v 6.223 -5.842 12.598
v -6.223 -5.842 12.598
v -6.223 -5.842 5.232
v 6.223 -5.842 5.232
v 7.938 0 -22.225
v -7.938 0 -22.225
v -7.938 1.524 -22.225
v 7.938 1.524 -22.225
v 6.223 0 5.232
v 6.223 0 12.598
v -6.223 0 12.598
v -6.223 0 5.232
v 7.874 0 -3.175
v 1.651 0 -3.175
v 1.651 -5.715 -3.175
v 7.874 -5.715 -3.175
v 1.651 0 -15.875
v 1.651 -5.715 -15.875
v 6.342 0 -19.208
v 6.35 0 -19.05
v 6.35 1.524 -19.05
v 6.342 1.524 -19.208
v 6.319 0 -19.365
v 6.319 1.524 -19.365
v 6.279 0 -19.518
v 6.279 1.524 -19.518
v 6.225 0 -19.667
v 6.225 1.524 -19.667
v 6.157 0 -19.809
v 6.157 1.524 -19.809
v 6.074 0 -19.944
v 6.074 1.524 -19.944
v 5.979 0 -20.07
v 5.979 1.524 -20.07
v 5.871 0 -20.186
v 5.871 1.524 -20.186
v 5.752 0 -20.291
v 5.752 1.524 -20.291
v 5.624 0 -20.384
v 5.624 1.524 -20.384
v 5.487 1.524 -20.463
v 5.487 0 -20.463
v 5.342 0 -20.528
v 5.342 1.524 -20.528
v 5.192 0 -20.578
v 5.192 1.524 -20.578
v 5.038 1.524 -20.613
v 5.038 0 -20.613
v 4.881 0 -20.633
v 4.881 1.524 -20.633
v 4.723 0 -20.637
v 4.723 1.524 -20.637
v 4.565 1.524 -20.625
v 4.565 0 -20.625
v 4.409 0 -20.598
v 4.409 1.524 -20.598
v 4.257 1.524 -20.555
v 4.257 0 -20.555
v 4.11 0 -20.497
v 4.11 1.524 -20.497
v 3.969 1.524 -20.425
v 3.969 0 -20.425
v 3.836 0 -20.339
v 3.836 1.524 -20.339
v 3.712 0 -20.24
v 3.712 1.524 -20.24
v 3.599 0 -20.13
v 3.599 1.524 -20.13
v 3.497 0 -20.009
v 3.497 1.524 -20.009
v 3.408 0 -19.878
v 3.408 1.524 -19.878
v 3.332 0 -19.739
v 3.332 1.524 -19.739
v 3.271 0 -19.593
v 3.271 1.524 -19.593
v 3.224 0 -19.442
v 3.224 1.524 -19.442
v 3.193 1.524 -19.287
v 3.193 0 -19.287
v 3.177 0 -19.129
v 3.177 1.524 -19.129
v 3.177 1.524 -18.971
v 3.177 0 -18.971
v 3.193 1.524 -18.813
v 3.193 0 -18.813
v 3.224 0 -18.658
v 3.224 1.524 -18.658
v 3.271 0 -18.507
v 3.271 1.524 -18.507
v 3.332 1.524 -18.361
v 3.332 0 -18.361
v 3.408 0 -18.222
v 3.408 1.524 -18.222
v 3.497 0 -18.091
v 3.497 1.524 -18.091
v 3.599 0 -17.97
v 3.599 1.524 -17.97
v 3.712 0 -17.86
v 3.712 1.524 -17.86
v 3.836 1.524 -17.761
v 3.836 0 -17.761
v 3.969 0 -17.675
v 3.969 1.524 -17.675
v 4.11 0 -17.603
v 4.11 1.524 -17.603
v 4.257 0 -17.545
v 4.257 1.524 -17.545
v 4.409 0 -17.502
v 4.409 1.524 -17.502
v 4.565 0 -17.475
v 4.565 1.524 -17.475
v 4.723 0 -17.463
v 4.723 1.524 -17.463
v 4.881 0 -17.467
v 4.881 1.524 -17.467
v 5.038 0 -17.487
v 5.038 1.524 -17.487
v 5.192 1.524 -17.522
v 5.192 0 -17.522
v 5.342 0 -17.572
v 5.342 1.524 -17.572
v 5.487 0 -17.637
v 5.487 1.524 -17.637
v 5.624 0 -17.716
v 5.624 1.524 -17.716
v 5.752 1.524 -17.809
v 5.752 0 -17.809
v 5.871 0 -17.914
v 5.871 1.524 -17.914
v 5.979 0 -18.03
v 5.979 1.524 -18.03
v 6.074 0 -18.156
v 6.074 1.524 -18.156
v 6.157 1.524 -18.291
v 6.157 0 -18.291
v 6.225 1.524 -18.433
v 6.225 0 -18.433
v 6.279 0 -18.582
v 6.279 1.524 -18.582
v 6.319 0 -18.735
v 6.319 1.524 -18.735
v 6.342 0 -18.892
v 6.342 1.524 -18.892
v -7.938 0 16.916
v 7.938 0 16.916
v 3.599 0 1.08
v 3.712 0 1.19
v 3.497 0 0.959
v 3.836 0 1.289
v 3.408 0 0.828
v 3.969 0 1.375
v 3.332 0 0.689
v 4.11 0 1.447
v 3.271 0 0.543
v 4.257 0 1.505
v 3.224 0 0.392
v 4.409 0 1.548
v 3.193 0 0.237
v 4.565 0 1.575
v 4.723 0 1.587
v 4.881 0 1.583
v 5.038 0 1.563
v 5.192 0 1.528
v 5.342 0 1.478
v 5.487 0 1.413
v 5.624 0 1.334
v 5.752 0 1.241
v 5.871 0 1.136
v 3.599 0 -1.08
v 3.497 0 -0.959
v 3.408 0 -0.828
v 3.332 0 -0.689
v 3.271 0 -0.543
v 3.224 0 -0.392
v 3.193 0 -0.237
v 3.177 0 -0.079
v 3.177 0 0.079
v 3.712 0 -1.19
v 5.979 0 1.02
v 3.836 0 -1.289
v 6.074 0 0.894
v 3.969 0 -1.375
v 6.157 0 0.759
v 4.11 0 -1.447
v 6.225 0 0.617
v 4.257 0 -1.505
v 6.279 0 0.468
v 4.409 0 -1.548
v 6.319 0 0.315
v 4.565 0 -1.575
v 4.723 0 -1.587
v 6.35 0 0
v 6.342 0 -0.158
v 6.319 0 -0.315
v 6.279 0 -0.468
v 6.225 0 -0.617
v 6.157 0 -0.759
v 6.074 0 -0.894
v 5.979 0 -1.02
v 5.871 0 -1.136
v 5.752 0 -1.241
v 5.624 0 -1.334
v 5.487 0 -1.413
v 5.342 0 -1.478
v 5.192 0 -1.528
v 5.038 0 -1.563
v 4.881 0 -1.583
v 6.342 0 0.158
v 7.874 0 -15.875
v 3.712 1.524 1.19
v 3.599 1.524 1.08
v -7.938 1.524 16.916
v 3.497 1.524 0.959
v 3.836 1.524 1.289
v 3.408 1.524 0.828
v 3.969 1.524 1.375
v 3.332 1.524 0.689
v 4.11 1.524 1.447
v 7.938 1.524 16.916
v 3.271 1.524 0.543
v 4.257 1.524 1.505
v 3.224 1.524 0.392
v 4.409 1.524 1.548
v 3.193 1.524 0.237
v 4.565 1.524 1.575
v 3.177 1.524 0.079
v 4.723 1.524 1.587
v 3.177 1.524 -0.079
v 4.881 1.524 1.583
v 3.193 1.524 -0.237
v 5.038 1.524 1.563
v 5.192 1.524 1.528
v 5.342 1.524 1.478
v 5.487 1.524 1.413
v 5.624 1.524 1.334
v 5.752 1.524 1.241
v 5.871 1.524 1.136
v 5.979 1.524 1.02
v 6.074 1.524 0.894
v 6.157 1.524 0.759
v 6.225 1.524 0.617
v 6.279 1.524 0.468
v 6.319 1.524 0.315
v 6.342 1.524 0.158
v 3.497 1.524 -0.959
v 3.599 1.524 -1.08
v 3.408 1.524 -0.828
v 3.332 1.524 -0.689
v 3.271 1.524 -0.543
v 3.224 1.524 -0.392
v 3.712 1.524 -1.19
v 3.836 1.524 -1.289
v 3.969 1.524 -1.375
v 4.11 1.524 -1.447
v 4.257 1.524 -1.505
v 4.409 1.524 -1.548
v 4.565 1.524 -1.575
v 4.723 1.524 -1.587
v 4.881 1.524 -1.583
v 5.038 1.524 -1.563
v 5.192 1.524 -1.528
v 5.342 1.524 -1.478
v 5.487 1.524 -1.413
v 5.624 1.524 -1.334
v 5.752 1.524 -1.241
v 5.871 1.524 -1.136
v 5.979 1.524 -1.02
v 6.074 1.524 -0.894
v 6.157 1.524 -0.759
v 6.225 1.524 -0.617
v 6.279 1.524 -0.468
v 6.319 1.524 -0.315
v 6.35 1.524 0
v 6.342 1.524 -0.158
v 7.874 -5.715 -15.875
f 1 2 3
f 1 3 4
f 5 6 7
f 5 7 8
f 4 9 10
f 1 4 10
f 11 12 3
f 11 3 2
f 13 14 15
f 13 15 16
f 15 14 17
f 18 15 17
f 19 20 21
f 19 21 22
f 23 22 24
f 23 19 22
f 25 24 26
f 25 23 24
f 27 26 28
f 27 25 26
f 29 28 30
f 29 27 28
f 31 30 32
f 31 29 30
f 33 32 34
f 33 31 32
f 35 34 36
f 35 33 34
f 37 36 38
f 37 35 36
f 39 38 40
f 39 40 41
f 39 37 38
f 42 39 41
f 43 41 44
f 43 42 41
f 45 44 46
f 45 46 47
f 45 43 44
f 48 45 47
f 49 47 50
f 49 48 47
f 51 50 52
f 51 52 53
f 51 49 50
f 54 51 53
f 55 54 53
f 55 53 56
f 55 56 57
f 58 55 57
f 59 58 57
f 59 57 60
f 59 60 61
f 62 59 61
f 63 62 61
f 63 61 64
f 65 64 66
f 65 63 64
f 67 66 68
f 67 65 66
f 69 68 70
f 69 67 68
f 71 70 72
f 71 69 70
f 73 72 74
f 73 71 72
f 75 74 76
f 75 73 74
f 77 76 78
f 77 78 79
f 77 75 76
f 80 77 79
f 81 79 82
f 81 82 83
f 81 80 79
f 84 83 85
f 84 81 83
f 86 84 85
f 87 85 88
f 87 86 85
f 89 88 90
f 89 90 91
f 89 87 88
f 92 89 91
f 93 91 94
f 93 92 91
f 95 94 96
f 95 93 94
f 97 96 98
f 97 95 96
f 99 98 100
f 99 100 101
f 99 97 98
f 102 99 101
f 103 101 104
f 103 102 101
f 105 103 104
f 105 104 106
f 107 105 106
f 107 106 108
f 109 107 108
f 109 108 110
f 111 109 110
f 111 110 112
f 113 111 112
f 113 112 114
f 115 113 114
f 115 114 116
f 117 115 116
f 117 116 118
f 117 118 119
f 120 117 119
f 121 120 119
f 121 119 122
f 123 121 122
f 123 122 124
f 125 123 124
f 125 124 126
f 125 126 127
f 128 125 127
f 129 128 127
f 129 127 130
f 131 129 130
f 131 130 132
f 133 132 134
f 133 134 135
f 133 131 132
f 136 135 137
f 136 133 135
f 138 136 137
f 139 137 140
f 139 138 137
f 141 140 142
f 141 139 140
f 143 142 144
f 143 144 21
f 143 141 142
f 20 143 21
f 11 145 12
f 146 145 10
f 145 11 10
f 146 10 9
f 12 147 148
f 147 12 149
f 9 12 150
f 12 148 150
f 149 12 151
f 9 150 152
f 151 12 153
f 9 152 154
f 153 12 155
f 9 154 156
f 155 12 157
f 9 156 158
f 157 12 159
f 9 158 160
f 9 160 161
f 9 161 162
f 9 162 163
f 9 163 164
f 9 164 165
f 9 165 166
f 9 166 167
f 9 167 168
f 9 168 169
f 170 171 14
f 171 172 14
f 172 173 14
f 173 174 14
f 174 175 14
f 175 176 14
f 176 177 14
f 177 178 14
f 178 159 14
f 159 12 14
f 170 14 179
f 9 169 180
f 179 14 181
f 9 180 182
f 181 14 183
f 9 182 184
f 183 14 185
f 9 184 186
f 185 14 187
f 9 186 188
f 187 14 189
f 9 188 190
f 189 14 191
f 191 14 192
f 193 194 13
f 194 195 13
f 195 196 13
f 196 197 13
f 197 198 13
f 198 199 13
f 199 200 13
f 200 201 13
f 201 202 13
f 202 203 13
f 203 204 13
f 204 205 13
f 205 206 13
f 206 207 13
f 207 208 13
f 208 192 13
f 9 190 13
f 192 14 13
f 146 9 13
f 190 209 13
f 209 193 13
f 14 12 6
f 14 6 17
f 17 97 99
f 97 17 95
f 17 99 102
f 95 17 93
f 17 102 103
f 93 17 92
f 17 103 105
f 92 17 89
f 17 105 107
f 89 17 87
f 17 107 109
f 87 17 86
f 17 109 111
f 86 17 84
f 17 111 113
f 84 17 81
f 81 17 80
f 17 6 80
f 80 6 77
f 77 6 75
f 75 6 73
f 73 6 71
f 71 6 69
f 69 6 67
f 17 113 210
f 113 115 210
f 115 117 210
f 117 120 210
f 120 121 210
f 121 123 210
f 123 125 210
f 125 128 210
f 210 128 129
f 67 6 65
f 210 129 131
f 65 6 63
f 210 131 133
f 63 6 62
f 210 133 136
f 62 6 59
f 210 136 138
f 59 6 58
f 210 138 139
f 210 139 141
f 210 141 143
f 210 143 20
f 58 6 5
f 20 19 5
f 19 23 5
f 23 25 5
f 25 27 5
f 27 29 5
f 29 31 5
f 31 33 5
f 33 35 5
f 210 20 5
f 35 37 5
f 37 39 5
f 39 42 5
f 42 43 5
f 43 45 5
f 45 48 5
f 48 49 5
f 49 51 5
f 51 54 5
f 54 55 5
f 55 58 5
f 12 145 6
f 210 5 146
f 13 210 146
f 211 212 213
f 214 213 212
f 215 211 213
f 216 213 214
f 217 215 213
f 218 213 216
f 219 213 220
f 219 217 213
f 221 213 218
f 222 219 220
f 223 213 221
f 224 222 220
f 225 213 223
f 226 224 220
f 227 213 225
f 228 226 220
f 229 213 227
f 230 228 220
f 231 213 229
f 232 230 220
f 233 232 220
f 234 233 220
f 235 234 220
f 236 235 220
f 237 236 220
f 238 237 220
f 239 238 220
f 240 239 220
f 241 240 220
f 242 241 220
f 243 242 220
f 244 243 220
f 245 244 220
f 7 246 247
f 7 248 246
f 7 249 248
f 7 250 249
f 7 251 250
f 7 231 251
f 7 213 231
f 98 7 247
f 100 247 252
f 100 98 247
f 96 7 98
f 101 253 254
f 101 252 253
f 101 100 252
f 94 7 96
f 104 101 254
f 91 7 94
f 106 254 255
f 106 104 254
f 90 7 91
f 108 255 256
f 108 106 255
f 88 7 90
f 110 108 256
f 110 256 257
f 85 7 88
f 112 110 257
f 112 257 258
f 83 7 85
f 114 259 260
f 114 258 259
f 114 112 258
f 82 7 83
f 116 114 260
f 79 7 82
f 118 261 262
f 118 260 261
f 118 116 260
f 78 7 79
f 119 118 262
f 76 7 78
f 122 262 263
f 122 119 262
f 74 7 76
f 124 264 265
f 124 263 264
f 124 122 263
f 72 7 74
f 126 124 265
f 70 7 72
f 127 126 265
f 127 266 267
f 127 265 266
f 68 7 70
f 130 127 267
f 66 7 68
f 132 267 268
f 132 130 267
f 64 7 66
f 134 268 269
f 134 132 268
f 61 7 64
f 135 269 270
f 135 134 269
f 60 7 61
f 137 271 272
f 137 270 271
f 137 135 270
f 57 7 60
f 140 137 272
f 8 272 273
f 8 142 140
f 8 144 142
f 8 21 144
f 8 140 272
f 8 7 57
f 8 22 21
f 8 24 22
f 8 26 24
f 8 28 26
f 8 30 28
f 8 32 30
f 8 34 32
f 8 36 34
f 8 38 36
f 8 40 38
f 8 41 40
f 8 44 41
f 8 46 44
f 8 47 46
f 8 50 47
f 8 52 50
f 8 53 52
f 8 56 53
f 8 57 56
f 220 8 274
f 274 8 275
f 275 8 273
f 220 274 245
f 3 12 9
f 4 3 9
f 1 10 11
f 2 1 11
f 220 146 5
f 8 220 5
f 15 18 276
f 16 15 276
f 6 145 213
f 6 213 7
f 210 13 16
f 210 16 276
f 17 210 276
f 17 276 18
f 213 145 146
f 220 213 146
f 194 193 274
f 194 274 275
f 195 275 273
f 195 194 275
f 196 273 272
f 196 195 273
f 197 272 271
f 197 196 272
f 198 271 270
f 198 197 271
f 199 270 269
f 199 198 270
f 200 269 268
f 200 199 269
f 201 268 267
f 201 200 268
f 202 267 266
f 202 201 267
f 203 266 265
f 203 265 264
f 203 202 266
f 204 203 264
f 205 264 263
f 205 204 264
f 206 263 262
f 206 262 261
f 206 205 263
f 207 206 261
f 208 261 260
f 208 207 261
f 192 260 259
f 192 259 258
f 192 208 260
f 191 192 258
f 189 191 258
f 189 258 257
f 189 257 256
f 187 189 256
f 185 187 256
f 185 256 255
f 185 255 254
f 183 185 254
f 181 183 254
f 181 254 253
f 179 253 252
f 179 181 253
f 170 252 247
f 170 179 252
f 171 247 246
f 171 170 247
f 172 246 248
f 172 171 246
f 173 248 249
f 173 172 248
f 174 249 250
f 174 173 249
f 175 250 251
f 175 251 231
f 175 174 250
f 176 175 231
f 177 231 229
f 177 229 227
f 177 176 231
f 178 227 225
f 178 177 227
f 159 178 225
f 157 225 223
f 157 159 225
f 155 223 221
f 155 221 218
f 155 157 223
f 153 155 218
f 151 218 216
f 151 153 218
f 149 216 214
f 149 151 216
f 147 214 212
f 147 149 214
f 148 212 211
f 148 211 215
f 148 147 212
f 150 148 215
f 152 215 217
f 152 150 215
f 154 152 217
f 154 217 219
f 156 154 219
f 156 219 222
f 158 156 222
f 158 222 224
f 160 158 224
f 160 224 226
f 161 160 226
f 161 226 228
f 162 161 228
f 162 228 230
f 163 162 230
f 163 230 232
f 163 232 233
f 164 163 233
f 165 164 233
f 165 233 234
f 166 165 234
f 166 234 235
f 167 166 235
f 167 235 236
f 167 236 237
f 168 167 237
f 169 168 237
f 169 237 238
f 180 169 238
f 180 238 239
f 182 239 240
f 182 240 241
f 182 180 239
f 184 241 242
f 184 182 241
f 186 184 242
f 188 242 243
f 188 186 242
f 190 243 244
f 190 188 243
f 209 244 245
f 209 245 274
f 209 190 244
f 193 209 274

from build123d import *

# Parameters (mm, degrees)
SKETCH1_W           = 15.875
SKETCH1_H           = 39.1414
BOSS_EXTRUDE1_DEPTH = 1.524
SKETCH1_4_W         = 6.223
SKETCH1_4_H         = 12.7
BOSS_EXTRUDE2_DEPTH = 1.524
SKETCH1_5_W         = 6.223
SKETCH1_5_H         = 12.7
BOSS_EXTRUDE3_DEPTH = 5.715
SKETCH2_W           = 12.446
SKETCH2_H           = 7.366
BOSS_EXTRUDE4_DEPTH = 5.842


with BuildPart() as part:
    # Sketch1 → Boss-Extrude1 (new body)
    with BuildSketch(Plane(origin=(0, 0, 0), x_dir=(1, 0, 0), z_dir=(0, 1, 0))):
        with Locations((0, 2.6543)):
            Rectangle(SKETCH1_W, SKETCH1_H)
        with BuildLine():
            ThreePointArc((6.35, 0), (3.639967985, -1.122532015), (4.7625, 1.5875))
            ThreePointArc((4.7625, 1.5875), (5.885032015, 1.122532015), (6.35, 0))
        make_face(mode=Mode.SUBTRACT)
        Polygon((1.651, 15.875), (4.7625, 15.875), (7.874, 15.875), (7.874, 3.175), (4.7625, 3.175), (1.651, 3.175), align=None, mode=Mode.SUBTRACT)
        with BuildLine():
            ThreePointArc((6.35, 19.05), (5.885032015, 17.927467985), (4.7625, 17.4625))
            ThreePointArc((4.7625, 17.4625), (3.639967985, 20.172532015), (6.35, 19.05))
        make_face(mode=Mode.SUBTRACT)
    extrude(amount=BOSS_EXTRUDE1_DEPTH)

    # Sketch1<4> → Boss-Extrude2 (add)
    with BuildSketch(Plane(origin=(0, 0, 0), x_dir=(1, 0, 0), z_dir=(0, 1, 0))):
        with Locations((4.7625, 9.525)):
            Rectangle(SKETCH1_4_W, SKETCH1_4_H)
    extrude(amount=BOSS_EXTRUDE2_DEPTH)

    # Sketch1<5> → Boss-Extrude3 (add)
    with BuildSketch(Plane(origin=(0, 0, 0), x_dir=(1, 0, 0), z_dir=(0, 1, 0))):
        with Locations((4.7625, 9.525)):
            Rectangle(SKETCH1_5_W, SKETCH1_5_H)
    extrude(amount=-BOSS_EXTRUDE3_DEPTH)

    # Sketch2 → Boss-Extrude4 (add)
    with BuildSketch(Plane.XZ):
        with Locations((0, 8.9154)):
            Rectangle(SKETCH2_W, SKETCH2_H)
    extrude(amount=BOSS_EXTRUDE4_DEPTH)


solid = part.part
